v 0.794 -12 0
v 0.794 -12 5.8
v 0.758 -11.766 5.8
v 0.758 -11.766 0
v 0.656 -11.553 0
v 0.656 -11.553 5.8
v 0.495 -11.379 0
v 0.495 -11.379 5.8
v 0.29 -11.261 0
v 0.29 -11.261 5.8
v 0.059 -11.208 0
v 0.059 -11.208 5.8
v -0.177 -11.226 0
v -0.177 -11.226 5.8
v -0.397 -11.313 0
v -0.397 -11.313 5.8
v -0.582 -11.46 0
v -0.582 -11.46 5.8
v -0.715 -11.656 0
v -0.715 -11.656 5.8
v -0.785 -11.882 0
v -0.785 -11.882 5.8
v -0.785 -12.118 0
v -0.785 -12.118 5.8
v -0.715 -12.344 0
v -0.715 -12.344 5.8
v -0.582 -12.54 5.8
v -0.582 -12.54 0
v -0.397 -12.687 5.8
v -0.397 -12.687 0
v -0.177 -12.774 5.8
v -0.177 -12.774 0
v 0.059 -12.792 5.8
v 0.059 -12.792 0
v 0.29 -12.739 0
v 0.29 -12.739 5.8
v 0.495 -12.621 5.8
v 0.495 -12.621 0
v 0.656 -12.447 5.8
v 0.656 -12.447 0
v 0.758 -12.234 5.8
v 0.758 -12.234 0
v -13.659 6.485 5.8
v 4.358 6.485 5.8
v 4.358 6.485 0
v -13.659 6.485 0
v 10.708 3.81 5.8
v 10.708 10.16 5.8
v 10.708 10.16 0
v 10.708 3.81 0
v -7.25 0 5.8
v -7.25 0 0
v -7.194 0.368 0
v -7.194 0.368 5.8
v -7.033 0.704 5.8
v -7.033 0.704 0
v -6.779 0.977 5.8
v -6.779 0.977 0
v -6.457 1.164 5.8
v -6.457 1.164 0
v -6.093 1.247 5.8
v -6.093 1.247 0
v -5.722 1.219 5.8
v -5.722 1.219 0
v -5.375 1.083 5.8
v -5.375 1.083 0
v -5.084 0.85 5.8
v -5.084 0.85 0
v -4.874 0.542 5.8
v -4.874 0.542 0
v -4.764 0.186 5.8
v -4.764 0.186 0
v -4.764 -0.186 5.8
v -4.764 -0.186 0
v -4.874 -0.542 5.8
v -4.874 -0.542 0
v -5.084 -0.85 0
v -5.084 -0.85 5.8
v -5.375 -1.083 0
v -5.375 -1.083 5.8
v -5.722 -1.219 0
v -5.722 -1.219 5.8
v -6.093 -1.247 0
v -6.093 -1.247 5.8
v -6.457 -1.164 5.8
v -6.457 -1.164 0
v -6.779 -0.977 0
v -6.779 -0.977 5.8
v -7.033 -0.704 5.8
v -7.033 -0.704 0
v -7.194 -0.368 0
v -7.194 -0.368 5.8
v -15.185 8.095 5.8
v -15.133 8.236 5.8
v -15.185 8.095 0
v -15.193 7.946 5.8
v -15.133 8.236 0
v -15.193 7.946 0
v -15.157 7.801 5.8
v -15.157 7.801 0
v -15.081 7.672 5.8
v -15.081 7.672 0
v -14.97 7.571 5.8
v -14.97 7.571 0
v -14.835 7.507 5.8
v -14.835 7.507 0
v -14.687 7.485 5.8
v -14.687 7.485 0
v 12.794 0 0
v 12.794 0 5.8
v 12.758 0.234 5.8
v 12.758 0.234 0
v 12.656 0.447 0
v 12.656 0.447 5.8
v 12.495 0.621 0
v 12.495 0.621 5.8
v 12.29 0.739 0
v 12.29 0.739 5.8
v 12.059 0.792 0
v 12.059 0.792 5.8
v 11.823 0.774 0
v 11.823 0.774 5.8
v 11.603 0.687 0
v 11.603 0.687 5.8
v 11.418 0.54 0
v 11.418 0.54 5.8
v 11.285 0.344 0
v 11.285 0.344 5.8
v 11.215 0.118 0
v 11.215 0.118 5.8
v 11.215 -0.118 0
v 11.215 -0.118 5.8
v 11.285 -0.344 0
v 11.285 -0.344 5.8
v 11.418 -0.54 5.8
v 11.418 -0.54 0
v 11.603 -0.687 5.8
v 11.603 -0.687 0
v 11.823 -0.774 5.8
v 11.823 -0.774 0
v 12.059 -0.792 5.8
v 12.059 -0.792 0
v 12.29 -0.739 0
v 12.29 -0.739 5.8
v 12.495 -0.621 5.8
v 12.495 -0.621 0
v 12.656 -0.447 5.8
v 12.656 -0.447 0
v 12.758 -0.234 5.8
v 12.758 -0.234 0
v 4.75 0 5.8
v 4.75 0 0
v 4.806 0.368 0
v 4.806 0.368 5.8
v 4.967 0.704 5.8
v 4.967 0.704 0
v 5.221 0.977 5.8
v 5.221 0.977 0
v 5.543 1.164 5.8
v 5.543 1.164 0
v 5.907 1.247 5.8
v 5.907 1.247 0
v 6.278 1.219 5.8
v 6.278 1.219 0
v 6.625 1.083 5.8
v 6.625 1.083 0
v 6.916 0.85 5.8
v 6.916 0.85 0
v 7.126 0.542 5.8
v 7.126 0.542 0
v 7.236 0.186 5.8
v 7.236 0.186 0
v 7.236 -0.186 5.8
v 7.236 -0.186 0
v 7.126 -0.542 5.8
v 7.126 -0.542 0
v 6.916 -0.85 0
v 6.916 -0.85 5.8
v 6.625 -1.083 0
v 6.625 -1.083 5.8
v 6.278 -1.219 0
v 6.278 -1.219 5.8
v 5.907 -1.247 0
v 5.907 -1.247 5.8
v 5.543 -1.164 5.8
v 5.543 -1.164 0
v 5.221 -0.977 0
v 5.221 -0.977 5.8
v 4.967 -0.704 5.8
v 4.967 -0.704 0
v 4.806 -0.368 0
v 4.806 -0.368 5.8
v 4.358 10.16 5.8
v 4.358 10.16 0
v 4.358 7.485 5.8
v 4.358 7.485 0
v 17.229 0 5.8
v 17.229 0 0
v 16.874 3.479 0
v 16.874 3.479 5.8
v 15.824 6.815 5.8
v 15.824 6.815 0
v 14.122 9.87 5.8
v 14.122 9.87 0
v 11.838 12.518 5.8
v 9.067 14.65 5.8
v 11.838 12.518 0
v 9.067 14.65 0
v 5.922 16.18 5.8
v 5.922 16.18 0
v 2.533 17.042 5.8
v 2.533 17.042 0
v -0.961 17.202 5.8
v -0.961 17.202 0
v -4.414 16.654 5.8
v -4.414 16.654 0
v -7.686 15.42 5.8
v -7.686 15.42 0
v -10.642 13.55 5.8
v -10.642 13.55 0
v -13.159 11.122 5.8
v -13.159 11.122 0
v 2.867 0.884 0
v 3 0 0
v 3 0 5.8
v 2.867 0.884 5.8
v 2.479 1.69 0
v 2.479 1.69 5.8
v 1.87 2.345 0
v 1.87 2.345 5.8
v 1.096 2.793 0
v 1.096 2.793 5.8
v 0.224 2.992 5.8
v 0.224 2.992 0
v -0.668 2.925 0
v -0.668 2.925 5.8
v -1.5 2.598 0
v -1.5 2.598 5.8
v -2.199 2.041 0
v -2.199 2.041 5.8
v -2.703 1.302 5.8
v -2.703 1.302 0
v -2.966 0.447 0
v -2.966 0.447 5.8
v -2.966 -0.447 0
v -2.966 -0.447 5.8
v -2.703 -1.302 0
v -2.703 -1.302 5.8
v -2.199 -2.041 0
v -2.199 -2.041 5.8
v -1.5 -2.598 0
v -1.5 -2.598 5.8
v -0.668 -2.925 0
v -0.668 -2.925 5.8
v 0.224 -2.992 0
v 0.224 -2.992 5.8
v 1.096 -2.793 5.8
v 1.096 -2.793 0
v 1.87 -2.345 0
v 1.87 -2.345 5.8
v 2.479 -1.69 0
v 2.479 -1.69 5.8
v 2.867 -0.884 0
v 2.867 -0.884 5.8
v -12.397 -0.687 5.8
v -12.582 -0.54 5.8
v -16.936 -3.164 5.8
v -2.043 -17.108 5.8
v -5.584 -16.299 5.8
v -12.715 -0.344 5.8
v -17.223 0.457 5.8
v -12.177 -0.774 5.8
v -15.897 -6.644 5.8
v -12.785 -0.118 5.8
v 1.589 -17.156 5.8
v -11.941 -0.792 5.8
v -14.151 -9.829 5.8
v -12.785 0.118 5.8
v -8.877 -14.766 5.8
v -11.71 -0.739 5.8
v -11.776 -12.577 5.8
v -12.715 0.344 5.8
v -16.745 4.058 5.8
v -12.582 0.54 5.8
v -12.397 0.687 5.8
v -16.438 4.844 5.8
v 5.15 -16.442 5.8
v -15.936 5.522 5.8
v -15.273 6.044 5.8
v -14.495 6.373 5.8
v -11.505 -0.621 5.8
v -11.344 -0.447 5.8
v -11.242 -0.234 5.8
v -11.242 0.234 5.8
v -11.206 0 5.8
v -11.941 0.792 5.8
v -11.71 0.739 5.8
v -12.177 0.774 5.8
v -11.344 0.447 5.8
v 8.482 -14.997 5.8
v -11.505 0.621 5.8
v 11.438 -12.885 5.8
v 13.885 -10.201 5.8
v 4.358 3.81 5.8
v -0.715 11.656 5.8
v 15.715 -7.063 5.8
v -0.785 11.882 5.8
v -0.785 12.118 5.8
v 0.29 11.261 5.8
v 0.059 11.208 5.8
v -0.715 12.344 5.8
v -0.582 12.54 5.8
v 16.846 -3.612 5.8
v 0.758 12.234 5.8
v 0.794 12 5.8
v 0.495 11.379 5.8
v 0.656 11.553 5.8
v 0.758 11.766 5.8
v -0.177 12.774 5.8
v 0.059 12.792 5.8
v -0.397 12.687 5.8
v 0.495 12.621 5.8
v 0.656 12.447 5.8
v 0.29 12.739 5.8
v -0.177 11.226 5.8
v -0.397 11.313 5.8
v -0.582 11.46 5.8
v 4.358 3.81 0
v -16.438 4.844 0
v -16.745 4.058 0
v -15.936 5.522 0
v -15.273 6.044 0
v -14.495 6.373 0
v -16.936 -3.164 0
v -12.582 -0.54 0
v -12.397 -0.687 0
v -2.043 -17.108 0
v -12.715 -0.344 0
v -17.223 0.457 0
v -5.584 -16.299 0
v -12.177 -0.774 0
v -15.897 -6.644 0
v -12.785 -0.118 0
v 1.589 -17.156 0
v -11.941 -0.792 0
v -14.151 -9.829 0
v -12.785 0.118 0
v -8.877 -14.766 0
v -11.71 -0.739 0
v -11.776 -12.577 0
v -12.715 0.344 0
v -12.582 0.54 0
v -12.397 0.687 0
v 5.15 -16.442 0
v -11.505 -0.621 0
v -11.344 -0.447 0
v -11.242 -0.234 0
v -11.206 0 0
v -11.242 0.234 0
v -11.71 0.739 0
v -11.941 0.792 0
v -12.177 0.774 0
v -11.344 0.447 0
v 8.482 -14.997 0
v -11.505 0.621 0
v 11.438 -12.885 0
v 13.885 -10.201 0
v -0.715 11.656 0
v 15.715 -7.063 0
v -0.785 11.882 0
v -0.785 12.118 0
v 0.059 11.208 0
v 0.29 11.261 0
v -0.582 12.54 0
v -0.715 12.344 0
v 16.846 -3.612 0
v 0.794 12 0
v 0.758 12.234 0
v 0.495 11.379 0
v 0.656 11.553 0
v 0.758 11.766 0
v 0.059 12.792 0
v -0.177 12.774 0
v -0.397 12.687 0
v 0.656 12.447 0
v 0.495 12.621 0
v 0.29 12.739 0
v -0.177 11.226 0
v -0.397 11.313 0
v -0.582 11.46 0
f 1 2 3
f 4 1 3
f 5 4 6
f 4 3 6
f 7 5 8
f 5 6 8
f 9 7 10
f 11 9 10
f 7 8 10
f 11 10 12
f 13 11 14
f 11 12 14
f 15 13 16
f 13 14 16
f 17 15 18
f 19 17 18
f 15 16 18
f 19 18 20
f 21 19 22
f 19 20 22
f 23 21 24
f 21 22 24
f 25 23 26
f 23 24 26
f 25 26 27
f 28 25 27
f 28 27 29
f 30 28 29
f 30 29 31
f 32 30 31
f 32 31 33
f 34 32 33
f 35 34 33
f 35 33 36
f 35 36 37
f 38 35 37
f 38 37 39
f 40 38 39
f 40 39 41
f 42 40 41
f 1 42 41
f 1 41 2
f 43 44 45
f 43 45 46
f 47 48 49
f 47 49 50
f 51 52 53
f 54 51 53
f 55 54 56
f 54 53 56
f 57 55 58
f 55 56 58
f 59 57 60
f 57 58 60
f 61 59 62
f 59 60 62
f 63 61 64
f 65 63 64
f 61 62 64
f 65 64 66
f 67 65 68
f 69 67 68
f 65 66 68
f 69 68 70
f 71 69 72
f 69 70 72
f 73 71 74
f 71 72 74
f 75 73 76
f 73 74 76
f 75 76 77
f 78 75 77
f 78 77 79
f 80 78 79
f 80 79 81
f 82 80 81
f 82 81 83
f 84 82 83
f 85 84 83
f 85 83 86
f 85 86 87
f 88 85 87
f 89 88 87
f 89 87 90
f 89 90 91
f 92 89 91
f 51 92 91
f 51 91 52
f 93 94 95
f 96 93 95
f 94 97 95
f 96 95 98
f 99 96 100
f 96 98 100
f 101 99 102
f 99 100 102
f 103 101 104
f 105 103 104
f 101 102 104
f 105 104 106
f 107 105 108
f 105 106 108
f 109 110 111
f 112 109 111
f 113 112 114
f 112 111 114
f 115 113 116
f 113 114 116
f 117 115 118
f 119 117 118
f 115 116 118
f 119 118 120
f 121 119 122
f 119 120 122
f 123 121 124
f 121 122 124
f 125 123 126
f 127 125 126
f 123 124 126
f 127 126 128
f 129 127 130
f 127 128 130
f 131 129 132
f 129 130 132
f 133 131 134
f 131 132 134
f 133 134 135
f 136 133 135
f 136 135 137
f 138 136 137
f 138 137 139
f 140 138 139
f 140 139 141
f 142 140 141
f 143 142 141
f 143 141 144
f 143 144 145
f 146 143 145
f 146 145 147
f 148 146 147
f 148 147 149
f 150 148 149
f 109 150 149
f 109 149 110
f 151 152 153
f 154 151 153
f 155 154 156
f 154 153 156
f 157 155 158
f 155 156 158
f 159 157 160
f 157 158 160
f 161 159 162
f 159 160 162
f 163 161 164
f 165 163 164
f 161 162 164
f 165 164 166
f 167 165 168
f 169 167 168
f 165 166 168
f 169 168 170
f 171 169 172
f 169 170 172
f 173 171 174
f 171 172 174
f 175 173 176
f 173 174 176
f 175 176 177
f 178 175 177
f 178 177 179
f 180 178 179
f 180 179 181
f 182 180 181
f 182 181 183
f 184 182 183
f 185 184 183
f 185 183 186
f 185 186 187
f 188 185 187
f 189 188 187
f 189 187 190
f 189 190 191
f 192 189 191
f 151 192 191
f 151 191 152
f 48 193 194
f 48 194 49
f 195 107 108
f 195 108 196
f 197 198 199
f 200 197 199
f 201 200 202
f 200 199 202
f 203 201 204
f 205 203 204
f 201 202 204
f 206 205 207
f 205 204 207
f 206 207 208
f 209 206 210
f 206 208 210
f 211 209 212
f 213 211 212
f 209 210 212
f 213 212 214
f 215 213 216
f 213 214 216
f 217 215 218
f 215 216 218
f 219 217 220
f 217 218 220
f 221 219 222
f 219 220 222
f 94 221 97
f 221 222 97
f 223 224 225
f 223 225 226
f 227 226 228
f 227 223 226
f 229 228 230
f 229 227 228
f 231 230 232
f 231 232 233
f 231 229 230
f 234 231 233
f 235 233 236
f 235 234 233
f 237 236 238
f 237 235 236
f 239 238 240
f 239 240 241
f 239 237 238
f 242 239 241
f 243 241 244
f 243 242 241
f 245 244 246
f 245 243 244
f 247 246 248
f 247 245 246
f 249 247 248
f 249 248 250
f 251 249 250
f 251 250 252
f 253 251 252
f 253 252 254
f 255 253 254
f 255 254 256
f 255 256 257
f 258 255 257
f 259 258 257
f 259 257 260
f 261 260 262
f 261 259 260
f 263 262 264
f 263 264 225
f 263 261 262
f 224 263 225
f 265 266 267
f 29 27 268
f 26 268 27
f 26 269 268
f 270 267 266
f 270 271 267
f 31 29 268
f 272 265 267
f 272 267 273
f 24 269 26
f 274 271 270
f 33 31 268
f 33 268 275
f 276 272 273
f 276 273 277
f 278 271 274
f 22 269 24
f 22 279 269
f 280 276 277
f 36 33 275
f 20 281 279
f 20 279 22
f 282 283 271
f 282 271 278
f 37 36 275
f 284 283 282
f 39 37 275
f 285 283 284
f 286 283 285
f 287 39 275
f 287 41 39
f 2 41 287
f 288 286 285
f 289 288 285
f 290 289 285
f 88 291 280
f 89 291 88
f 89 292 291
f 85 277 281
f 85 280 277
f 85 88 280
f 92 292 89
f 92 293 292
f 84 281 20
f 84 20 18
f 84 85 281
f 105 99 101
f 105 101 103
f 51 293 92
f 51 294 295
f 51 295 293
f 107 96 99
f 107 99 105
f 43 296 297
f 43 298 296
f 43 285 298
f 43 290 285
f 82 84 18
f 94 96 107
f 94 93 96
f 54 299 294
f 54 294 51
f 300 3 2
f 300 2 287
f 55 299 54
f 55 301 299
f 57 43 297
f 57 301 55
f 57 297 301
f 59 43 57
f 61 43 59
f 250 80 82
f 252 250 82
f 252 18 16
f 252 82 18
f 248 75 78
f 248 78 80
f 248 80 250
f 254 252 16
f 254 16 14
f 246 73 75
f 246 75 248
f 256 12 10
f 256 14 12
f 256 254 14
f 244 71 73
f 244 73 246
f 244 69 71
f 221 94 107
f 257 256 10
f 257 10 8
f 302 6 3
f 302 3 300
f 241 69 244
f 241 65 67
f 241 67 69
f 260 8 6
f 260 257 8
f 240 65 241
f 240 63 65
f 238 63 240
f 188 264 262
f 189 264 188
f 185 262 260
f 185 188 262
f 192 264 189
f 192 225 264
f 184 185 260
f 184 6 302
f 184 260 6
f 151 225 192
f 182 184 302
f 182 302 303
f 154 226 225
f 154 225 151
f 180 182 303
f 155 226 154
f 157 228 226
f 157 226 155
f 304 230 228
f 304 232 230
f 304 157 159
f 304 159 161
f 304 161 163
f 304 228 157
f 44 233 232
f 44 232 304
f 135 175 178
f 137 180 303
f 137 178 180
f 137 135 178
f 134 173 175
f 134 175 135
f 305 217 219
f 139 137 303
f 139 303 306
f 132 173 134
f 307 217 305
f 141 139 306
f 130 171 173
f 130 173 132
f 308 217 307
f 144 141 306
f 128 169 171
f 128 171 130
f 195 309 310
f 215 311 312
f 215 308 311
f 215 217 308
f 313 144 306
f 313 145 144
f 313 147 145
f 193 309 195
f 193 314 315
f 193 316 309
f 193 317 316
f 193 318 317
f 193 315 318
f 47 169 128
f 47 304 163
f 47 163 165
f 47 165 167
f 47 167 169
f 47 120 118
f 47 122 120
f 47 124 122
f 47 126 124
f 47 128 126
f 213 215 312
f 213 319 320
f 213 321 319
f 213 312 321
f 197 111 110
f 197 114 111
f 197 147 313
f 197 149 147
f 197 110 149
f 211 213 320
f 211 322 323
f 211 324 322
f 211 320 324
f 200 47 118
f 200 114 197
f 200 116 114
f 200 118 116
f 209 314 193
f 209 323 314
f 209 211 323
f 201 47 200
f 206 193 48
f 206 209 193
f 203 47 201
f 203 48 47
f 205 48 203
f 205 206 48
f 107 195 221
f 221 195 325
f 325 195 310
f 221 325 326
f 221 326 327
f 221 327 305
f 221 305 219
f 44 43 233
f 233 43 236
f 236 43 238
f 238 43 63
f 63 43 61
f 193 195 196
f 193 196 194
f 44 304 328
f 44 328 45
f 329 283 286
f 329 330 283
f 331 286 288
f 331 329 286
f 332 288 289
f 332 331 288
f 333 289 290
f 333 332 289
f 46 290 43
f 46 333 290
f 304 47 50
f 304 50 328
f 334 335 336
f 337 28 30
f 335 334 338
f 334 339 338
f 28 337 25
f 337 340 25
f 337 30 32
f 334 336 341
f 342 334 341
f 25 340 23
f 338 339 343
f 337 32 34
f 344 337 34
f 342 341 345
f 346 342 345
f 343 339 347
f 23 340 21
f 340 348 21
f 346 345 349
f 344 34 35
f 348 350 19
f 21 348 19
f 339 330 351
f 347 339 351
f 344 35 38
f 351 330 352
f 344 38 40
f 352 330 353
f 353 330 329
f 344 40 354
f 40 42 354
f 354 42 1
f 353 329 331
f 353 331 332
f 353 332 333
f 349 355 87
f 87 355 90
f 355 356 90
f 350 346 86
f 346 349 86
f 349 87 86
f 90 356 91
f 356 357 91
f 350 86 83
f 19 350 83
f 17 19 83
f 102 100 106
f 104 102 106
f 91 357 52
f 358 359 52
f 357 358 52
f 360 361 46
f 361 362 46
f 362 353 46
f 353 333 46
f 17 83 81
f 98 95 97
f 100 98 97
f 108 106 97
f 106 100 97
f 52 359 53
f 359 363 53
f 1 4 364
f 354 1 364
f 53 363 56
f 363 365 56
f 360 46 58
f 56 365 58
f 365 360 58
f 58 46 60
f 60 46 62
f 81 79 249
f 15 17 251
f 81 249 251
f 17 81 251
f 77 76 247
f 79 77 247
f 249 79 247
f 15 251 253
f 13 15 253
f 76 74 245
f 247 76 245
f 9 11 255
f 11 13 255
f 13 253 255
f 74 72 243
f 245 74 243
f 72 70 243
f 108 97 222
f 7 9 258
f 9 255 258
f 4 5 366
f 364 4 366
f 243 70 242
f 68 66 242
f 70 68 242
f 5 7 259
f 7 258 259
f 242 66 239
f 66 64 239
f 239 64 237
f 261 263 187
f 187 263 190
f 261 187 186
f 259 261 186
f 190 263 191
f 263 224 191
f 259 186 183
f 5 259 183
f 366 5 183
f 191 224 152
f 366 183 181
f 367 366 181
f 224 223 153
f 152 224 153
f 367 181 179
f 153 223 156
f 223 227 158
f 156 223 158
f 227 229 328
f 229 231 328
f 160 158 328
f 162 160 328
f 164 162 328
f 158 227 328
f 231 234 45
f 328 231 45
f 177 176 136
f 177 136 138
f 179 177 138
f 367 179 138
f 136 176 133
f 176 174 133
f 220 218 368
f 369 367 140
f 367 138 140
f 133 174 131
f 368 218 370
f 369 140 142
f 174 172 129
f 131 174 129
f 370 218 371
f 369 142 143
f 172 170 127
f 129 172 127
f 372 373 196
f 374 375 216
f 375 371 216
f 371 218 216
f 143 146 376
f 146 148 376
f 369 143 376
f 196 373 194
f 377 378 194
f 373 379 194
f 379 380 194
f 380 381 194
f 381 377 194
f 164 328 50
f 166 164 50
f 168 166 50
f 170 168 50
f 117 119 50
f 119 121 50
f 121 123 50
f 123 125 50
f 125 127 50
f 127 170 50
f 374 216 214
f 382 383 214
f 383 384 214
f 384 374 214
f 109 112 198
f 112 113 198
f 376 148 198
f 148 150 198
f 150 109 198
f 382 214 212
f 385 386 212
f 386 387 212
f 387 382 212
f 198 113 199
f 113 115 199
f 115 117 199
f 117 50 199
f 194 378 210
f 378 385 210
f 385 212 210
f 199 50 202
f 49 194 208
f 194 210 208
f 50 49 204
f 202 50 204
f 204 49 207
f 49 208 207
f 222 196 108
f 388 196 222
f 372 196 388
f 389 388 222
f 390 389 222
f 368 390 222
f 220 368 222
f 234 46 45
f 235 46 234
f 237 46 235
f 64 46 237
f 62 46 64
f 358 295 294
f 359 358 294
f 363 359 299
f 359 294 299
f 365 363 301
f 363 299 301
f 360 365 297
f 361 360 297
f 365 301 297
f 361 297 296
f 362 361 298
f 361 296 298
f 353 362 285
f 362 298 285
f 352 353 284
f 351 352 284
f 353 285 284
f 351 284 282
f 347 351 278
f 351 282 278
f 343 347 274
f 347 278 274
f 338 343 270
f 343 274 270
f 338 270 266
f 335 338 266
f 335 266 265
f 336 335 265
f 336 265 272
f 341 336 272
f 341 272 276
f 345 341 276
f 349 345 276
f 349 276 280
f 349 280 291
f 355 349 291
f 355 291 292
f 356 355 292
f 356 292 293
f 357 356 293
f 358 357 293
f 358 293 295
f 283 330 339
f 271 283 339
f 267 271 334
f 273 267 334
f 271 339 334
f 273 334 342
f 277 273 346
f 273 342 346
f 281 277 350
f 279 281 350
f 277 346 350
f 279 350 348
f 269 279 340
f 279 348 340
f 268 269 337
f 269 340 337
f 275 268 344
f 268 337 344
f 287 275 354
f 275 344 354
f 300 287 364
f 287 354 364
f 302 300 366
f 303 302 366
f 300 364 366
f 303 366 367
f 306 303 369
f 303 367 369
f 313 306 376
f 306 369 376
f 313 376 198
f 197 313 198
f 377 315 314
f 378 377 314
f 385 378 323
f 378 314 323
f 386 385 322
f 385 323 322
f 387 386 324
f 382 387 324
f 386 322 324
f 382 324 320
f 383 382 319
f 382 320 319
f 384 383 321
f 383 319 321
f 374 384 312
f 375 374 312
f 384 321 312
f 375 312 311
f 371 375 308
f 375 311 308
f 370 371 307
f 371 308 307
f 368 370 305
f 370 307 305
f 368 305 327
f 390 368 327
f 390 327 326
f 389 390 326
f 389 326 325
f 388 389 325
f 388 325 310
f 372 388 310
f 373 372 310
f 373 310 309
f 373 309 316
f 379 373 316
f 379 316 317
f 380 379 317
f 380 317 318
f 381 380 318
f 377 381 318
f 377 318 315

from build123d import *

# Parameters (mm, degrees)
SKETCH1_R                 = 17.229166667
SKETCH1_R_2               = 3
BOSS_EXTRUDE1_DEPTH       = 5.8
SKETCH2_R                 = 0.79375
CUT_EXTRUDE1_DEPTH        = 26.046524071
CUT_EXTRUDE2_DEPTH        = 26.046524071
FILLET1_R                 = 3.175
FILLET2_R                 = 0.508
M3X0_5_TAPPED_HOLE1_D     = 2.5
M3X0_5_TAPPED_HOLE1_DEPTH = 8.636
M3X0_5_TAPPED_HOLE1_TIP   = 0.751075774


with BuildPart() as part:
    # Sketch1 → Boss-Extrude1 (new body)
    with BuildSketch(Plane.XY):
        Circle(SKETCH1_R)
        Circle(SKETCH1_R_2, mode=Mode.SUBTRACT)
    extrude(amount=BOSS_EXTRUDE1_DEPTH)

    # Sketch2 → Cut-Extrude1 (cut, through all)
    with BuildSketch(Plane.XY.offset(5.8)):
        with Locations((0, 12)):
            Circle(SKETCH2_R)
        with Locations((12, 0)):
            Circle(SKETCH2_R)
        with Locations((0, -12)):
            Circle(SKETCH2_R)
        with Locations((-12, 0)):
            Circle(SKETCH2_R)
    extrude(amount=-CUT_EXTRUDE1_DEPTH, mode=Mode.SUBTRACT)

    # Sketch3 → Cut-Extrude2 (cut, through all)
    with BuildSketch(Plane.XY.offset(5.8)):
        with BuildLine():
            Line((-15.518342664, 7.485), (4.357889894, 7.485))
            Line((4.357889894, 7.485), (4.357889894, 10.16))
            Line((4.357889894, 10.16), (10.707889894, 10.16))
            Line((10.707889894, 10.16), (10.707889894, 3.81))
            Line((10.707889894, 3.81), (4.357889894, 3.81))
            Line((4.357889894, 3.81), (4.357889894, 6.485))
            Line((4.357889894, 6.485), (-15.962110106, 6.485))
            ThreePointArc((-15.962110106, 6.485), (-15.748165818, 6.988523262), (-15.518342664, 7.485))
        make_face()
    extrude(amount=-CUT_EXTRUDE2_DEPTH, mode=Mode.SUBTRACT)

    # Fillet1
    fillet1_edges = [part.edges().sort_by_distance(p)[0] for p in [
        (-15.962110106, 6.485, 2.9),
    ]]
    fillet(fillet1_edges, radius=FILLET1_R)

    # Fillet2
    fillet2_edges = [part.edges().sort_by_distance(p)[0] for p in [
        (-15.518342664, 7.485, 2.9),
    ]]
    fillet(fillet2_edges, radius=FILLET2_R)

    # M3x0.5 Tapped Hole1
    with Locations(Plane.XY.offset(5.8)):
        with Locations((-6, 0), (6, 0)):
            Hole(M3X0_5_TAPPED_HOLE1_D / 2, depth=M3X0_5_TAPPED_HOLE1_DEPTH)
            with Locations((0, 0, -(M3X0_5_TAPPED_HOLE1_DEPTH + M3X0_5_TAPPED_HOLE1_TIP / 2))):  # 118° drill point
                Cone(0, M3X0_5_TAPPED_HOLE1_D / 2, M3X0_5_TAPPED_HOLE1_TIP, mode=Mode.SUBTRACT)


solid = part.part
